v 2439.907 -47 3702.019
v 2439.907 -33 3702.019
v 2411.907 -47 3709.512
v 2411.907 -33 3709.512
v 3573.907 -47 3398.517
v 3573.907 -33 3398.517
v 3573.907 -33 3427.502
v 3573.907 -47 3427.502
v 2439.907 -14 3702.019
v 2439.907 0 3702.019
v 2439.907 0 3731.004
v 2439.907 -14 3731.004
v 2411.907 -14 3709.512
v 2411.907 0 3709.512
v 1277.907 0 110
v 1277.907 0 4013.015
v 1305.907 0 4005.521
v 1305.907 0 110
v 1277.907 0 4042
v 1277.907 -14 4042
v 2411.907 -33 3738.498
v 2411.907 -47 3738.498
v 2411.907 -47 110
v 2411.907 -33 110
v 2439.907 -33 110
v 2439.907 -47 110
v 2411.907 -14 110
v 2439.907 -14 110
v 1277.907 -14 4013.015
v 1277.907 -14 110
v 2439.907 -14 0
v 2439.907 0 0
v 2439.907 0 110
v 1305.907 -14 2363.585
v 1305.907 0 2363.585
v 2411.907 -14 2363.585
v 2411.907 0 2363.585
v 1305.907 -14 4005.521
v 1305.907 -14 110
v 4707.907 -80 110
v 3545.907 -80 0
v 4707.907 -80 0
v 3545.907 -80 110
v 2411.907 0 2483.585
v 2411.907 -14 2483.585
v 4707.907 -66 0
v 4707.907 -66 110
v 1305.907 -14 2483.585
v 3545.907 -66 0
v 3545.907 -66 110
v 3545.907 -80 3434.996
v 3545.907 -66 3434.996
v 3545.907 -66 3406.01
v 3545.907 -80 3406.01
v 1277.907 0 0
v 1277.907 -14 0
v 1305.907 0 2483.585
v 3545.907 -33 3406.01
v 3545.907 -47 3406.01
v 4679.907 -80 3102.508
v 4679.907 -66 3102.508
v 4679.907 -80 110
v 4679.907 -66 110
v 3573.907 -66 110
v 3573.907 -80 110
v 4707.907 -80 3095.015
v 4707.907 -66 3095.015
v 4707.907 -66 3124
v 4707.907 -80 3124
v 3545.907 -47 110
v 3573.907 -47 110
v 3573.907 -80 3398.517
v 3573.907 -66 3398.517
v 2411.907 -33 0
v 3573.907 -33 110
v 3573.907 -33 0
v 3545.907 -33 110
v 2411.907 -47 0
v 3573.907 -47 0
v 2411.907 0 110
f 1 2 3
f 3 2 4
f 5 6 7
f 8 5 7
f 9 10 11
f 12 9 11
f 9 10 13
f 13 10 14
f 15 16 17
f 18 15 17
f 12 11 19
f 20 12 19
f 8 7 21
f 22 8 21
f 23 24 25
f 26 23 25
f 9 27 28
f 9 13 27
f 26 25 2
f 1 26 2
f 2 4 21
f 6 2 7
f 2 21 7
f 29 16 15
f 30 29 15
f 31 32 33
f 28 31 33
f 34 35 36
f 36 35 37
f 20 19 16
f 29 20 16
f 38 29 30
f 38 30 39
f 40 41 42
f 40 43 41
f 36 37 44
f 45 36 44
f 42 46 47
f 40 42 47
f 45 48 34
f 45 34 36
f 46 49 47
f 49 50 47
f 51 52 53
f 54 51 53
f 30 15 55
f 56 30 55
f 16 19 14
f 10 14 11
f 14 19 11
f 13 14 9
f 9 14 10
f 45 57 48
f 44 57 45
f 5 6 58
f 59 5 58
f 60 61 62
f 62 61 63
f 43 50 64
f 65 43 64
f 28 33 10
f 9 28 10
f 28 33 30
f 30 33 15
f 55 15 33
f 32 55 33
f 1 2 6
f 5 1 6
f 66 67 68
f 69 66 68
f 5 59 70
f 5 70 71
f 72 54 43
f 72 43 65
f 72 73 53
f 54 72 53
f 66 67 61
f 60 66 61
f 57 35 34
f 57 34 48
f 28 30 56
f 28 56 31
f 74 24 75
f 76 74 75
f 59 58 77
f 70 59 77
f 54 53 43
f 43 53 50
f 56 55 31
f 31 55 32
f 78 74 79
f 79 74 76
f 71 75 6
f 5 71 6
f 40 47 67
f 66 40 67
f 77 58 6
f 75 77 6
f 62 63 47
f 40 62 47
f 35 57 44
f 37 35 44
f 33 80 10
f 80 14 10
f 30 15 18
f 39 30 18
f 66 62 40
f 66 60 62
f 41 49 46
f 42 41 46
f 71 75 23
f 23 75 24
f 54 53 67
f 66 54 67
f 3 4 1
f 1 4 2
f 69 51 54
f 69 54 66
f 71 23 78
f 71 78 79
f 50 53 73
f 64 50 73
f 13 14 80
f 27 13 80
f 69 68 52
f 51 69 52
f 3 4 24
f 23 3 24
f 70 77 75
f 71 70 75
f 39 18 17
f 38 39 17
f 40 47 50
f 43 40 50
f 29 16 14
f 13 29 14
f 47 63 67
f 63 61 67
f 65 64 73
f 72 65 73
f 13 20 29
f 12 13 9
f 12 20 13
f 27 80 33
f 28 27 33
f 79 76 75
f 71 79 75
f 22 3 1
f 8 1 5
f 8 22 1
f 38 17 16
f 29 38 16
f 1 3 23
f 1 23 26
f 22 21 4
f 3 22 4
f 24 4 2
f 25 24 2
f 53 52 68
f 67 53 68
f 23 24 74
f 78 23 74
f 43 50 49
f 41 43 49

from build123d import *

# Parameters (mm, degrees)
F5_DEPTH  = 14
F6_DEPTH  = 14
F7_DEPTH  = 14
F8_DEPTH  = 14
F9_START  = 33
F9_DEPTH  = 14
F10_START = 33
F10_DEPTH = 14
F11_START = 33
F11_DEPTH = 14
F12_START = 33
F12_DEPTH = 14
F13_START = 66
F13_DEPTH = 14
F14_START = 66
F14_DEPTH = 14
F15_START = 66
F15_DEPTH = 14
F16_START = 66
F16_DEPTH = 14
F3_W      = 1106
F3_H      = 120
F17_DEPTH = 14


with BuildPart() as f5:
    # F3 (on Front) → F5 (new body)
    with BuildSketch(Plane.XZ):
        Polygon((1277.9065368968, 4042), (1277.9065368968, 4013.0145174139), (1305.9065368968, 4005.5206398629), (2411.9065368968, 3709.5124765976), (2439.9065368968, 3702.0185990465), (2439.9065368968, 3731.0040816327), align=None)
    extrude(amount=F5_DEPTH)


with BuildPart() as f6:
    # F3 (on Front) → F6 (new body)
    with BuildSketch(Plane.XZ):
        Polygon((2411.9065368968, 2363.5847568512), (2411.9065368968, 110), (2439.9065368968, 110), (2439.9065368968, 3702.0185990465), (2411.9065368968, 3709.5124765976), (2411.9065368968, 2483.5847568512), align=None)
    extrude(amount=F6_DEPTH)


with BuildPart() as f7:
    # F3 (on Front) → F7 (new body)
    with BuildSketch(Plane.XZ):
        Polygon((1277.9065368968, 4013.0145174139), (1277.9065368968, 110), (1305.9065368968, 110), (1305.9065368968, 2363.5847568512), (1305.9065368968, 2483.5847568512), (1305.9065368968, 4005.5206398629), align=None)
    extrude(amount=F7_DEPTH)


with BuildPart() as f8:
    # F3 (on Front) → F8 (new body)
    with BuildSketch(Plane.XZ):
        Polygon((1277.9065368968, 110), (1277.9065368968, 0), (2411.9065368968, 0), (2439.9065368968, 0), (2439.9065368968, 110), (2411.9065368968, 110), (1305.9065368968, 110), align=None)
    extrude(amount=F8_DEPTH)


with BuildPart() as f9:
    # F4 (on Front) → F9 (new body)
    with BuildSketch(Plane.XZ.offset(F9_START)):
        Polygon((2411.9065368968, 3738.4979591837), (2411.9065368968, 3709.5124765976), (2439.9065368968, 3702.0185990465), (3545.9065368968, 3406.0104357812), (3573.9065368968, 3398.5165582302), (3573.9065368968, 3427.5020408163), align=None)
    extrude(amount=F9_DEPTH)


with BuildPart() as f10:
    # F4 (on Front) → F10 (new body)
    with BuildSketch(Plane.XZ.offset(F10_START)):
        Polygon((2411.9065368968, 3709.5124765976), (2411.9065368968, 110), (2439.9065368968, 110), (2439.9065368968, 3702.0185990465), align=None)
    extrude(amount=F10_DEPTH)


with BuildPart() as f11:
    # F4 (on Front) → F11 (new body)
    with BuildSketch(Plane.XZ.offset(F11_START)):
        Polygon((3545.9065368968, 3406.0104357812), (3545.9065368968, 110), (3573.9065368968, 110), (3573.9065368968, 3398.5165582302), align=None)
    extrude(amount=F11_DEPTH)


with BuildPart() as f12:
    # F4 (on Front) → F12 (new body)
    with BuildSketch(Plane.XZ.offset(F12_START)):
        Polygon((2439.9065368968, 110), (2411.9065368968, 110), (2411.9065368968, 0), (3573.9065368968, 0), (3573.9065368968, 110), (3545.9065368968, 110), align=None)
    extrude(amount=F12_DEPTH)


with BuildPart() as f13:
    # F3 (on Front) → F13 (new body)
    with BuildSketch(Plane.XZ.offset(F13_START)):
        Polygon((4679.9065368968, 3102.5083949649), (4707.9065368968, 3095.0145174139), (4707.9065368968, 3124), (3545.9065368968, 3434.9959183673), (3545.9065368968, 3406.0104357812), (3573.9065368968, 3398.5165582302), align=None)
    extrude(amount=F13_DEPTH)


with BuildPart() as f14:
    # F3 (on Front) → F14 (new body)
    with BuildSketch(Plane.XZ.offset(F14_START)):
        Polygon((3545.9065368968, 3406.0104357812), (3545.9065368968, 110), (3573.9065368968, 110), (3573.9065368968, 3398.5165582302), align=None)
    extrude(amount=F14_DEPTH)


with BuildPart() as f15:
    # F3 (on Front) → F15 (new body)
    with BuildSketch(Plane.XZ.offset(F15_START)):
        Polygon((4679.9065368968, 110), (4707.9065368968, 110), (4707.9065368968, 3095.0145174139), (4679.9065368968, 3102.5083949649), align=None)
    extrude(amount=F15_DEPTH)


with BuildPart() as f16:
    # F3 (on Front) → F16 (new body)
    with BuildSketch(Plane.XZ.offset(F16_START)):
        Polygon((3545.9065368968, 0), (4707.9065368968, 0), (4707.9065368968, 110), (4679.9065368968, 110), (3573.9065368968, 110), (3545.9065368968, 110), align=None)
    extrude(amount=F16_DEPTH)


with BuildPart() as f17:
    # F3 (on Front) → F17 (new body)
    with BuildSketch(Plane.XZ):
        with Locations((1858.9065368968, 2423.5847568512)):
            Rectangle(F3_W, F3_H)
    extrude(amount=F17_DEPTH)


solid = Compound([f5.part, f6.part, f7.part, f8.part, f9.part, f10.part, f11.part, f12.part, f13.part, f14.part, f15.part, f16.part, f17.part])
